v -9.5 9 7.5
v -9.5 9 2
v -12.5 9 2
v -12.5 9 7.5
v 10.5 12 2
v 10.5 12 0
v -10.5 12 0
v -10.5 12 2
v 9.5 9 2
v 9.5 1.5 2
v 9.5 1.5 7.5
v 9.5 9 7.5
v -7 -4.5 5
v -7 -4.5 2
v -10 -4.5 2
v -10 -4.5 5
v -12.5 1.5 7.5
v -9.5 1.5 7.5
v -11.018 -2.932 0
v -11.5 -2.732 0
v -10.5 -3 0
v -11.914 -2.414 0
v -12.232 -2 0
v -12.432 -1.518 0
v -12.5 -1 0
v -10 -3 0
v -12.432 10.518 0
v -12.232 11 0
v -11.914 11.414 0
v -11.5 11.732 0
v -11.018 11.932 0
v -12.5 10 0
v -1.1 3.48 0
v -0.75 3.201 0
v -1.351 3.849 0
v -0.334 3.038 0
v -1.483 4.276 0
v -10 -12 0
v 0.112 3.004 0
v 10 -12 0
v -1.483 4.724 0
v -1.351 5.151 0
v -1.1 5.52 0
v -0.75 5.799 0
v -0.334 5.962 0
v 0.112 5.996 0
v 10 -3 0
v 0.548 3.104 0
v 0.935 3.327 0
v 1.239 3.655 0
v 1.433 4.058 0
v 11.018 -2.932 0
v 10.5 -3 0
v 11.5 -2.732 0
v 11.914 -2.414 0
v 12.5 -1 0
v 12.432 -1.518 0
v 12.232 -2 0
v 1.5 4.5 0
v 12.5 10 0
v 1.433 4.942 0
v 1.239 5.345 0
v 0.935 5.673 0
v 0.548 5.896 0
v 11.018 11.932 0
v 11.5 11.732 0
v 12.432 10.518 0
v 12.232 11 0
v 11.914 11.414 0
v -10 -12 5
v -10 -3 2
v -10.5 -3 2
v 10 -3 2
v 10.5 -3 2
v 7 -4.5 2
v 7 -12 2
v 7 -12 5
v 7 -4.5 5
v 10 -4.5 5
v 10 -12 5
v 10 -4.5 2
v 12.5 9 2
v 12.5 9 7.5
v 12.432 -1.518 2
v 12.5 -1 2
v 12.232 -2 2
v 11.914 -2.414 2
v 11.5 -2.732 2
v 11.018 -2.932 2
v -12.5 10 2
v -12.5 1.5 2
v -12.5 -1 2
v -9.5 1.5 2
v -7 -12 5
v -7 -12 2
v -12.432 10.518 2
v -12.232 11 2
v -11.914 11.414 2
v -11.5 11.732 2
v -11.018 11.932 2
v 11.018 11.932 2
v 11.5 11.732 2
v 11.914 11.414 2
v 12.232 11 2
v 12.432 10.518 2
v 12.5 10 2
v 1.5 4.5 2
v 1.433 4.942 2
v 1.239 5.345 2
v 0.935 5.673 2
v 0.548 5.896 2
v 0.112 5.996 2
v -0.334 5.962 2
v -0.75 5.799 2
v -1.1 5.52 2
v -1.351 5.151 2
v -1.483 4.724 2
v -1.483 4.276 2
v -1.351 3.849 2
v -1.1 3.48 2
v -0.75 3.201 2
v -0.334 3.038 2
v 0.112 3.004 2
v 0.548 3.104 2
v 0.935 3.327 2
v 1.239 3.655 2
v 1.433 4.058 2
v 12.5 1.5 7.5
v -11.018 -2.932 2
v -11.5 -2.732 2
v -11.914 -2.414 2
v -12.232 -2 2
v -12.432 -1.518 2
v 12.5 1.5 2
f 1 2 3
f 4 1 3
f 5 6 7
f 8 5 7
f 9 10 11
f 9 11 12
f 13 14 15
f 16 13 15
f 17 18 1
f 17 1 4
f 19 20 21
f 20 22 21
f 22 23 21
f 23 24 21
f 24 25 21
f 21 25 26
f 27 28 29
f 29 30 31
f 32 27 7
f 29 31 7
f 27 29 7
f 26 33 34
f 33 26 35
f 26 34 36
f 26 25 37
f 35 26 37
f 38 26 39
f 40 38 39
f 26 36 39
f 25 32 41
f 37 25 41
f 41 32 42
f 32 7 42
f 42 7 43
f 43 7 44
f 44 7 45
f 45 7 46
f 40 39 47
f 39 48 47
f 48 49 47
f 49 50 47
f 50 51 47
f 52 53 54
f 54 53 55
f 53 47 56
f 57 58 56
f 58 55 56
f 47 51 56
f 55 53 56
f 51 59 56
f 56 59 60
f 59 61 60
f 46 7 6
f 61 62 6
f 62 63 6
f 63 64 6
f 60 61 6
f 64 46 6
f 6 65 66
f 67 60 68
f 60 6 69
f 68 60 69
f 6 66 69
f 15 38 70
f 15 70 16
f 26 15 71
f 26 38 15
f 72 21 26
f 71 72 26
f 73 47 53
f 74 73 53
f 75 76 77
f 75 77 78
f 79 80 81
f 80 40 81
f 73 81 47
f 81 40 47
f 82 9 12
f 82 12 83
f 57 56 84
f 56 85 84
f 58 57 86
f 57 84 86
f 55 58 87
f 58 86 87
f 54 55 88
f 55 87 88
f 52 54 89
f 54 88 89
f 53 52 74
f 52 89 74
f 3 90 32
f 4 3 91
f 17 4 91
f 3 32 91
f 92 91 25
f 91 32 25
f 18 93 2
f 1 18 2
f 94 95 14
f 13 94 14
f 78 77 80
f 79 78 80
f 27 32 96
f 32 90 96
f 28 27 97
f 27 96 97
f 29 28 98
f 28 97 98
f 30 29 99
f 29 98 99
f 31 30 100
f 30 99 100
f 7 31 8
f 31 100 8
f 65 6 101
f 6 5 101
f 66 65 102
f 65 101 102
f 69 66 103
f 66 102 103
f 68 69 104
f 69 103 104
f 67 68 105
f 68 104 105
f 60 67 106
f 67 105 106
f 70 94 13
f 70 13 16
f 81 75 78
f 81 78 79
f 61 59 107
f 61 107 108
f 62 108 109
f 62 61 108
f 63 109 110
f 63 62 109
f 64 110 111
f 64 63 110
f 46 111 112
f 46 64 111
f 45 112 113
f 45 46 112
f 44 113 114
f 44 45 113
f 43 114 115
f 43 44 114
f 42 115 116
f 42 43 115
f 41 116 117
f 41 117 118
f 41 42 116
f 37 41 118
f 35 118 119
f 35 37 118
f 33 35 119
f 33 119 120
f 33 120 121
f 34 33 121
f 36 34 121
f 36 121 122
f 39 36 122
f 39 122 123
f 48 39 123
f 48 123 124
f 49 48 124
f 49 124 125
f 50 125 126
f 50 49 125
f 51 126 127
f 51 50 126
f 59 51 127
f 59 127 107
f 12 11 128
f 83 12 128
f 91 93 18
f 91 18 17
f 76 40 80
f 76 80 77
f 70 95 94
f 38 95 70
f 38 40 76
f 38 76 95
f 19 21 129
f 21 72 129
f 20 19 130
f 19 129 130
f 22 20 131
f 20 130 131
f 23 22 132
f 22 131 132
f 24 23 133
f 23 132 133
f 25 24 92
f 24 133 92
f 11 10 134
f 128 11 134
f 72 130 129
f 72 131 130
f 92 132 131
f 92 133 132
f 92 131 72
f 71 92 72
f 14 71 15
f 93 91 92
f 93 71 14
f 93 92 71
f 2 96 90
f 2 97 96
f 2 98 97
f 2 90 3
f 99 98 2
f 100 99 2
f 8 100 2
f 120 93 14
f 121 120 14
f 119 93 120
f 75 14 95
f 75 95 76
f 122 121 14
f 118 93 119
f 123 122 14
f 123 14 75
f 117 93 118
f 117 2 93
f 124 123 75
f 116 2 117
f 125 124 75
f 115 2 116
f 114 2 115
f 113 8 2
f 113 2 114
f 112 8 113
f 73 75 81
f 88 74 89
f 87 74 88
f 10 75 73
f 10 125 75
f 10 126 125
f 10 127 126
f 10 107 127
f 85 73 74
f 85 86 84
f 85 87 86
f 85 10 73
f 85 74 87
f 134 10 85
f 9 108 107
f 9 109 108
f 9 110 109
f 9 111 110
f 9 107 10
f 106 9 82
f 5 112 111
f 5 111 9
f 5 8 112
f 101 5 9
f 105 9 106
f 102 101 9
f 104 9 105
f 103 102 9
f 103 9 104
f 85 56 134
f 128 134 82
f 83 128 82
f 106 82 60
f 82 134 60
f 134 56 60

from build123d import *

# Parameters (mm, degrees)
F0_R     = 1.5
F1_DEPTH = 2
F2_W     = 3
F2_H     = 7.5
F3_DEPTH = 3
F4_DEPTH = 5.5
F5_R     = 2


# Not quite as in the source:
# - a pattern or mirror of a feature is missing from the dataset's text; its kind, count and spacing are read off the source's solid


with BuildPart() as f1:
    # F0 (on Top) → F1 (new body)
    with BuildSketch(Plane.XY):
        Polygon((12.5, 12), (0, 12), (-12.5, 12), (-12.5, -3), (-10, -3), (-10, -12), (0, -12), (10, -12), (10, -3), (12.5, -3), align=None)
        with Locations((0, 4.5)):
            Circle(F0_R, mode=Mode.SUBTRACT)
    extrude(amount=F1_DEPTH)

    # F2 (on face) → F3 (join)
    with BuildSketch(Plane.XY.offset(2)):
        with Locations((8.5, -8.25)):
            Rectangle(F2_W, F2_H)
    f3 = extrude(amount=F3_DEPTH)

    # F3_copies: F3 across plane
    add(f3.mirror(Plane(origin=(0, 0, 0), x_dir=(0, 0, -1), z_dir=(-1, 0, 0))))

    # F2 (on face) → F4 (join)
    with BuildSketch(Plane.XY.offset(2)):
        with Locations((11, 5.25)):
            Rectangle(F2_W, F2_H)
    f4 = extrude(amount=F4_DEPTH)

    # F4_copies: F4 across plane
    add(f4.mirror(Plane(origin=(0, 0, 0), x_dir=(0, 0, -1), z_dir=(-1, 0, 0))))

    # F5
    f5_edges = [f1.edges().sort_by_distance(p)[0] for p in [
        (12.5, 12, 1),
        (12.5, -3, 1),
        (-12.5, -3, 1),
        (-12.5, 12, 1),
    ]]
    fillet(f5_edges, radius=F5_R)


solid = f1.part
